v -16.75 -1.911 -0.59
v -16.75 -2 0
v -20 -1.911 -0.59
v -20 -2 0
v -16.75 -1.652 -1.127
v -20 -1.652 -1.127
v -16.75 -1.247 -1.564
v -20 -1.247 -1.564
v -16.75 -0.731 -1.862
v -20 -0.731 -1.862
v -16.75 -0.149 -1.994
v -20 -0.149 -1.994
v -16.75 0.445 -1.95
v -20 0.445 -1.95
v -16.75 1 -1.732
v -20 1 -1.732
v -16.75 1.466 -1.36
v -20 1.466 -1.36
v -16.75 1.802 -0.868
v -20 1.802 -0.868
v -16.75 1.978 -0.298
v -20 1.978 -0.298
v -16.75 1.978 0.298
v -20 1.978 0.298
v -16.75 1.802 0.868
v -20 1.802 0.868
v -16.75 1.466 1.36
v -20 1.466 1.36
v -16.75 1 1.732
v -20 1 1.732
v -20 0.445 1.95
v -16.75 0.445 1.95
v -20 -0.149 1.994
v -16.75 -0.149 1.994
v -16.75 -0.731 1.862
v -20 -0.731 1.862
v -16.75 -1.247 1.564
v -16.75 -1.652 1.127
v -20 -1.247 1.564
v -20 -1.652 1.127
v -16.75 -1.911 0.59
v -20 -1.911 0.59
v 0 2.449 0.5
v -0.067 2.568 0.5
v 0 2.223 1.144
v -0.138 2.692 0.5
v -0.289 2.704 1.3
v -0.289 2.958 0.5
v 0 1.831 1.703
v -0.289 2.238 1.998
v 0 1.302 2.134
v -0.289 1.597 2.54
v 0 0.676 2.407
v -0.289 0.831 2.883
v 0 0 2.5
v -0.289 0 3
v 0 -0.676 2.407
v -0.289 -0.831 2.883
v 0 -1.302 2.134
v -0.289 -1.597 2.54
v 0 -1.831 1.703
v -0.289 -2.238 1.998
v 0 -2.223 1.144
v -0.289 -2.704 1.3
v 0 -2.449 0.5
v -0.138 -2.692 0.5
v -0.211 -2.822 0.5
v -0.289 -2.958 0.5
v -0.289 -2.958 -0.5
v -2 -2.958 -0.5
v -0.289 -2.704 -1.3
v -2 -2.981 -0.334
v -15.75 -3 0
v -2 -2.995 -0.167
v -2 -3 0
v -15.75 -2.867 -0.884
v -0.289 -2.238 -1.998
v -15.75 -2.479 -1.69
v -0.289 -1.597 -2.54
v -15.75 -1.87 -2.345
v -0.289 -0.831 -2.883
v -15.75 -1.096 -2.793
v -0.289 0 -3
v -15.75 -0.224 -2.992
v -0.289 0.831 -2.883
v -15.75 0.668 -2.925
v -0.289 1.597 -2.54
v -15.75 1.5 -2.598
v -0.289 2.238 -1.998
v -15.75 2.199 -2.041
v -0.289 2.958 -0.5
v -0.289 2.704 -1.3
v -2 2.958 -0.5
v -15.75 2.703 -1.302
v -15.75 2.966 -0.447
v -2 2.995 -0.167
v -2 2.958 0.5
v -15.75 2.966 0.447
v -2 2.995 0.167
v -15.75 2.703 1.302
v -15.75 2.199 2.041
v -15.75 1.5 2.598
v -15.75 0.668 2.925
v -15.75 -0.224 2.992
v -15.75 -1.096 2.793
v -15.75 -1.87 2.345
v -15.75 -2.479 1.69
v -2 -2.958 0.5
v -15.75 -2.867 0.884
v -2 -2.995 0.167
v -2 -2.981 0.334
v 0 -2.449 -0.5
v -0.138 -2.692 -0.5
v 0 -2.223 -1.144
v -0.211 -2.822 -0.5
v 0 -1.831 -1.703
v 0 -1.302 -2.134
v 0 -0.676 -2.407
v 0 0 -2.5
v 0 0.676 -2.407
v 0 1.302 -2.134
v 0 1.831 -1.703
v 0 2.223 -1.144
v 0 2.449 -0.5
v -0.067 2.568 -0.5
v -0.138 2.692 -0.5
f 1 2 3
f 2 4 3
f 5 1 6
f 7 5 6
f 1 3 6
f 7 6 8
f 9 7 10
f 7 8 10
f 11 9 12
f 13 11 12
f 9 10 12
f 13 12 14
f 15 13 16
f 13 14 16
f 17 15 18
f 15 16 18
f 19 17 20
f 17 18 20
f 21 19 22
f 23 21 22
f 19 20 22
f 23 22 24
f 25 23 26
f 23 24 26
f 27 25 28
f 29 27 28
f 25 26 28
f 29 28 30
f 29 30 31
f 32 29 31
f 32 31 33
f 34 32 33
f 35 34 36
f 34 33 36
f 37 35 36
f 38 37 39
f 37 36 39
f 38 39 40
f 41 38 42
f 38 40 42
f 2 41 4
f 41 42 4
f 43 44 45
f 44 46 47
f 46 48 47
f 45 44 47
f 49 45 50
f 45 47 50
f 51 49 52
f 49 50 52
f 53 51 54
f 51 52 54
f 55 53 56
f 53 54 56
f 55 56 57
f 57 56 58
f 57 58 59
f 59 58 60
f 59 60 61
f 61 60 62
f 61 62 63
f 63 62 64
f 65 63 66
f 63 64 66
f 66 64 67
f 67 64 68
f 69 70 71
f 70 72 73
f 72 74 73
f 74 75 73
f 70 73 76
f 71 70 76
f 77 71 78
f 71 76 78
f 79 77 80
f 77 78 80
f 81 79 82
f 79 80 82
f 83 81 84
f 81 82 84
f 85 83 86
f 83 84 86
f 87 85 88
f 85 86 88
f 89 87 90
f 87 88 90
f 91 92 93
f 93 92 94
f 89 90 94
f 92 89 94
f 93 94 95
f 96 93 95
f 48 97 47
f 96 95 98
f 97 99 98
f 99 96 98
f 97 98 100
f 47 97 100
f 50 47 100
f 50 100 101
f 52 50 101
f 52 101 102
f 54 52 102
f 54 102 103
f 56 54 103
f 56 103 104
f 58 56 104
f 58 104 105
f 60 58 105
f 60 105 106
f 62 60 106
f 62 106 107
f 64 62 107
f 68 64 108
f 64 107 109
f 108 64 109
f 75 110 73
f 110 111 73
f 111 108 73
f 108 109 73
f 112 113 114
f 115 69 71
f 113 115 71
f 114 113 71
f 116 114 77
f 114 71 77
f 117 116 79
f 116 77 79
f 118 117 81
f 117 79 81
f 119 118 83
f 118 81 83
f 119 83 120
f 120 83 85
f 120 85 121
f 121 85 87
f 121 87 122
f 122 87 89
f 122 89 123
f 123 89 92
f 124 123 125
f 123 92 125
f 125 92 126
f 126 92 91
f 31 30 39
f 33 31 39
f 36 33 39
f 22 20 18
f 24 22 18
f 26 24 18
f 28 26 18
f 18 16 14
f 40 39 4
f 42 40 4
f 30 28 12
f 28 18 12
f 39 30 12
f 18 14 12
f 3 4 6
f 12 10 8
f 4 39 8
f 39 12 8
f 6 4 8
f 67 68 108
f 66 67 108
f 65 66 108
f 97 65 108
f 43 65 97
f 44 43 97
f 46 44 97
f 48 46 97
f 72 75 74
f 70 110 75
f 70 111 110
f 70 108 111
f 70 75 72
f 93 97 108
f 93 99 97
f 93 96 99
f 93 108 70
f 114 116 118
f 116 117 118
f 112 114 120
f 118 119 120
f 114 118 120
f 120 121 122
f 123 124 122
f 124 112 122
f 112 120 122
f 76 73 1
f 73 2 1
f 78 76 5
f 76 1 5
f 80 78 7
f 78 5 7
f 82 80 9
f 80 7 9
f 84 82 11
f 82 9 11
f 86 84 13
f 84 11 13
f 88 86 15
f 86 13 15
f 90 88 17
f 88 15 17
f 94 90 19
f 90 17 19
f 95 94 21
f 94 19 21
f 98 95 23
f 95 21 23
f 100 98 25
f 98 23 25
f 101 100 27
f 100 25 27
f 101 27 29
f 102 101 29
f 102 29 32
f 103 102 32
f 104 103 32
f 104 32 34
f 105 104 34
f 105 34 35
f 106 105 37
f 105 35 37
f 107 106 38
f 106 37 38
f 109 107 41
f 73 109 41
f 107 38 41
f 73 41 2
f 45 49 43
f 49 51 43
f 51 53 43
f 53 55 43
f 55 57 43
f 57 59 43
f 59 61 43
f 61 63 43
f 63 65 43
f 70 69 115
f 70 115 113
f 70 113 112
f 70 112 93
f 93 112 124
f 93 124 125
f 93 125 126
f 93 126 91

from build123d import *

# Parameters (mm, degrees)
CHAMFER1_SIZE      = 0.5
CHAMFER1_SIZE2     = 0.288675135
SKETCH2_W          = 1
SKETCH2_H          = 6
CUT_EXTRUDE2_DEPTH = 2


with BuildPart() as part:
    # Sketch1 → Revolve1 (revolve)
    with BuildSketch(Plane.XY, mode=Mode.PRIVATE) as revolve1_sk:
        Polygon((0, 0), (0, 3), (-15.75, 3), (-16.75, 2), (-20, 2), (-20, 0), align=None)
    revolve(revolve1_sk.sketch.rotate(Axis((-20, 0, 0), (1, 0, 0)), 180), axis=Axis((-20, 0, 0), (1, 0, 0)))

    # Chamfer1
    chamfer1_edges = [part.edges().sort_by_distance(p)[0] for p in [
        (0, 3, 0),
    ]]
    chamfer1_side = [part.faces().sort_by_distance(p)[0] for p in [
        (0, 0, 0),
    ]]
    chamfer(chamfer1_edges, length=CHAMFER1_SIZE, length2=CHAMFER1_SIZE2, reference=chamfer1_side[0])

    # Sketch2 → Cut-Extrude2 (cut)
    with BuildSketch(Plane(origin=(0, 0, 0), x_dir=(0, 0, -1), z_dir=(1, 0, 0))):
        Rectangle(SKETCH2_W, SKETCH2_H)
    extrude(amount=-CUT_EXTRUDE2_DEPTH, mode=Mode.SUBTRACT)


solid = part.part
